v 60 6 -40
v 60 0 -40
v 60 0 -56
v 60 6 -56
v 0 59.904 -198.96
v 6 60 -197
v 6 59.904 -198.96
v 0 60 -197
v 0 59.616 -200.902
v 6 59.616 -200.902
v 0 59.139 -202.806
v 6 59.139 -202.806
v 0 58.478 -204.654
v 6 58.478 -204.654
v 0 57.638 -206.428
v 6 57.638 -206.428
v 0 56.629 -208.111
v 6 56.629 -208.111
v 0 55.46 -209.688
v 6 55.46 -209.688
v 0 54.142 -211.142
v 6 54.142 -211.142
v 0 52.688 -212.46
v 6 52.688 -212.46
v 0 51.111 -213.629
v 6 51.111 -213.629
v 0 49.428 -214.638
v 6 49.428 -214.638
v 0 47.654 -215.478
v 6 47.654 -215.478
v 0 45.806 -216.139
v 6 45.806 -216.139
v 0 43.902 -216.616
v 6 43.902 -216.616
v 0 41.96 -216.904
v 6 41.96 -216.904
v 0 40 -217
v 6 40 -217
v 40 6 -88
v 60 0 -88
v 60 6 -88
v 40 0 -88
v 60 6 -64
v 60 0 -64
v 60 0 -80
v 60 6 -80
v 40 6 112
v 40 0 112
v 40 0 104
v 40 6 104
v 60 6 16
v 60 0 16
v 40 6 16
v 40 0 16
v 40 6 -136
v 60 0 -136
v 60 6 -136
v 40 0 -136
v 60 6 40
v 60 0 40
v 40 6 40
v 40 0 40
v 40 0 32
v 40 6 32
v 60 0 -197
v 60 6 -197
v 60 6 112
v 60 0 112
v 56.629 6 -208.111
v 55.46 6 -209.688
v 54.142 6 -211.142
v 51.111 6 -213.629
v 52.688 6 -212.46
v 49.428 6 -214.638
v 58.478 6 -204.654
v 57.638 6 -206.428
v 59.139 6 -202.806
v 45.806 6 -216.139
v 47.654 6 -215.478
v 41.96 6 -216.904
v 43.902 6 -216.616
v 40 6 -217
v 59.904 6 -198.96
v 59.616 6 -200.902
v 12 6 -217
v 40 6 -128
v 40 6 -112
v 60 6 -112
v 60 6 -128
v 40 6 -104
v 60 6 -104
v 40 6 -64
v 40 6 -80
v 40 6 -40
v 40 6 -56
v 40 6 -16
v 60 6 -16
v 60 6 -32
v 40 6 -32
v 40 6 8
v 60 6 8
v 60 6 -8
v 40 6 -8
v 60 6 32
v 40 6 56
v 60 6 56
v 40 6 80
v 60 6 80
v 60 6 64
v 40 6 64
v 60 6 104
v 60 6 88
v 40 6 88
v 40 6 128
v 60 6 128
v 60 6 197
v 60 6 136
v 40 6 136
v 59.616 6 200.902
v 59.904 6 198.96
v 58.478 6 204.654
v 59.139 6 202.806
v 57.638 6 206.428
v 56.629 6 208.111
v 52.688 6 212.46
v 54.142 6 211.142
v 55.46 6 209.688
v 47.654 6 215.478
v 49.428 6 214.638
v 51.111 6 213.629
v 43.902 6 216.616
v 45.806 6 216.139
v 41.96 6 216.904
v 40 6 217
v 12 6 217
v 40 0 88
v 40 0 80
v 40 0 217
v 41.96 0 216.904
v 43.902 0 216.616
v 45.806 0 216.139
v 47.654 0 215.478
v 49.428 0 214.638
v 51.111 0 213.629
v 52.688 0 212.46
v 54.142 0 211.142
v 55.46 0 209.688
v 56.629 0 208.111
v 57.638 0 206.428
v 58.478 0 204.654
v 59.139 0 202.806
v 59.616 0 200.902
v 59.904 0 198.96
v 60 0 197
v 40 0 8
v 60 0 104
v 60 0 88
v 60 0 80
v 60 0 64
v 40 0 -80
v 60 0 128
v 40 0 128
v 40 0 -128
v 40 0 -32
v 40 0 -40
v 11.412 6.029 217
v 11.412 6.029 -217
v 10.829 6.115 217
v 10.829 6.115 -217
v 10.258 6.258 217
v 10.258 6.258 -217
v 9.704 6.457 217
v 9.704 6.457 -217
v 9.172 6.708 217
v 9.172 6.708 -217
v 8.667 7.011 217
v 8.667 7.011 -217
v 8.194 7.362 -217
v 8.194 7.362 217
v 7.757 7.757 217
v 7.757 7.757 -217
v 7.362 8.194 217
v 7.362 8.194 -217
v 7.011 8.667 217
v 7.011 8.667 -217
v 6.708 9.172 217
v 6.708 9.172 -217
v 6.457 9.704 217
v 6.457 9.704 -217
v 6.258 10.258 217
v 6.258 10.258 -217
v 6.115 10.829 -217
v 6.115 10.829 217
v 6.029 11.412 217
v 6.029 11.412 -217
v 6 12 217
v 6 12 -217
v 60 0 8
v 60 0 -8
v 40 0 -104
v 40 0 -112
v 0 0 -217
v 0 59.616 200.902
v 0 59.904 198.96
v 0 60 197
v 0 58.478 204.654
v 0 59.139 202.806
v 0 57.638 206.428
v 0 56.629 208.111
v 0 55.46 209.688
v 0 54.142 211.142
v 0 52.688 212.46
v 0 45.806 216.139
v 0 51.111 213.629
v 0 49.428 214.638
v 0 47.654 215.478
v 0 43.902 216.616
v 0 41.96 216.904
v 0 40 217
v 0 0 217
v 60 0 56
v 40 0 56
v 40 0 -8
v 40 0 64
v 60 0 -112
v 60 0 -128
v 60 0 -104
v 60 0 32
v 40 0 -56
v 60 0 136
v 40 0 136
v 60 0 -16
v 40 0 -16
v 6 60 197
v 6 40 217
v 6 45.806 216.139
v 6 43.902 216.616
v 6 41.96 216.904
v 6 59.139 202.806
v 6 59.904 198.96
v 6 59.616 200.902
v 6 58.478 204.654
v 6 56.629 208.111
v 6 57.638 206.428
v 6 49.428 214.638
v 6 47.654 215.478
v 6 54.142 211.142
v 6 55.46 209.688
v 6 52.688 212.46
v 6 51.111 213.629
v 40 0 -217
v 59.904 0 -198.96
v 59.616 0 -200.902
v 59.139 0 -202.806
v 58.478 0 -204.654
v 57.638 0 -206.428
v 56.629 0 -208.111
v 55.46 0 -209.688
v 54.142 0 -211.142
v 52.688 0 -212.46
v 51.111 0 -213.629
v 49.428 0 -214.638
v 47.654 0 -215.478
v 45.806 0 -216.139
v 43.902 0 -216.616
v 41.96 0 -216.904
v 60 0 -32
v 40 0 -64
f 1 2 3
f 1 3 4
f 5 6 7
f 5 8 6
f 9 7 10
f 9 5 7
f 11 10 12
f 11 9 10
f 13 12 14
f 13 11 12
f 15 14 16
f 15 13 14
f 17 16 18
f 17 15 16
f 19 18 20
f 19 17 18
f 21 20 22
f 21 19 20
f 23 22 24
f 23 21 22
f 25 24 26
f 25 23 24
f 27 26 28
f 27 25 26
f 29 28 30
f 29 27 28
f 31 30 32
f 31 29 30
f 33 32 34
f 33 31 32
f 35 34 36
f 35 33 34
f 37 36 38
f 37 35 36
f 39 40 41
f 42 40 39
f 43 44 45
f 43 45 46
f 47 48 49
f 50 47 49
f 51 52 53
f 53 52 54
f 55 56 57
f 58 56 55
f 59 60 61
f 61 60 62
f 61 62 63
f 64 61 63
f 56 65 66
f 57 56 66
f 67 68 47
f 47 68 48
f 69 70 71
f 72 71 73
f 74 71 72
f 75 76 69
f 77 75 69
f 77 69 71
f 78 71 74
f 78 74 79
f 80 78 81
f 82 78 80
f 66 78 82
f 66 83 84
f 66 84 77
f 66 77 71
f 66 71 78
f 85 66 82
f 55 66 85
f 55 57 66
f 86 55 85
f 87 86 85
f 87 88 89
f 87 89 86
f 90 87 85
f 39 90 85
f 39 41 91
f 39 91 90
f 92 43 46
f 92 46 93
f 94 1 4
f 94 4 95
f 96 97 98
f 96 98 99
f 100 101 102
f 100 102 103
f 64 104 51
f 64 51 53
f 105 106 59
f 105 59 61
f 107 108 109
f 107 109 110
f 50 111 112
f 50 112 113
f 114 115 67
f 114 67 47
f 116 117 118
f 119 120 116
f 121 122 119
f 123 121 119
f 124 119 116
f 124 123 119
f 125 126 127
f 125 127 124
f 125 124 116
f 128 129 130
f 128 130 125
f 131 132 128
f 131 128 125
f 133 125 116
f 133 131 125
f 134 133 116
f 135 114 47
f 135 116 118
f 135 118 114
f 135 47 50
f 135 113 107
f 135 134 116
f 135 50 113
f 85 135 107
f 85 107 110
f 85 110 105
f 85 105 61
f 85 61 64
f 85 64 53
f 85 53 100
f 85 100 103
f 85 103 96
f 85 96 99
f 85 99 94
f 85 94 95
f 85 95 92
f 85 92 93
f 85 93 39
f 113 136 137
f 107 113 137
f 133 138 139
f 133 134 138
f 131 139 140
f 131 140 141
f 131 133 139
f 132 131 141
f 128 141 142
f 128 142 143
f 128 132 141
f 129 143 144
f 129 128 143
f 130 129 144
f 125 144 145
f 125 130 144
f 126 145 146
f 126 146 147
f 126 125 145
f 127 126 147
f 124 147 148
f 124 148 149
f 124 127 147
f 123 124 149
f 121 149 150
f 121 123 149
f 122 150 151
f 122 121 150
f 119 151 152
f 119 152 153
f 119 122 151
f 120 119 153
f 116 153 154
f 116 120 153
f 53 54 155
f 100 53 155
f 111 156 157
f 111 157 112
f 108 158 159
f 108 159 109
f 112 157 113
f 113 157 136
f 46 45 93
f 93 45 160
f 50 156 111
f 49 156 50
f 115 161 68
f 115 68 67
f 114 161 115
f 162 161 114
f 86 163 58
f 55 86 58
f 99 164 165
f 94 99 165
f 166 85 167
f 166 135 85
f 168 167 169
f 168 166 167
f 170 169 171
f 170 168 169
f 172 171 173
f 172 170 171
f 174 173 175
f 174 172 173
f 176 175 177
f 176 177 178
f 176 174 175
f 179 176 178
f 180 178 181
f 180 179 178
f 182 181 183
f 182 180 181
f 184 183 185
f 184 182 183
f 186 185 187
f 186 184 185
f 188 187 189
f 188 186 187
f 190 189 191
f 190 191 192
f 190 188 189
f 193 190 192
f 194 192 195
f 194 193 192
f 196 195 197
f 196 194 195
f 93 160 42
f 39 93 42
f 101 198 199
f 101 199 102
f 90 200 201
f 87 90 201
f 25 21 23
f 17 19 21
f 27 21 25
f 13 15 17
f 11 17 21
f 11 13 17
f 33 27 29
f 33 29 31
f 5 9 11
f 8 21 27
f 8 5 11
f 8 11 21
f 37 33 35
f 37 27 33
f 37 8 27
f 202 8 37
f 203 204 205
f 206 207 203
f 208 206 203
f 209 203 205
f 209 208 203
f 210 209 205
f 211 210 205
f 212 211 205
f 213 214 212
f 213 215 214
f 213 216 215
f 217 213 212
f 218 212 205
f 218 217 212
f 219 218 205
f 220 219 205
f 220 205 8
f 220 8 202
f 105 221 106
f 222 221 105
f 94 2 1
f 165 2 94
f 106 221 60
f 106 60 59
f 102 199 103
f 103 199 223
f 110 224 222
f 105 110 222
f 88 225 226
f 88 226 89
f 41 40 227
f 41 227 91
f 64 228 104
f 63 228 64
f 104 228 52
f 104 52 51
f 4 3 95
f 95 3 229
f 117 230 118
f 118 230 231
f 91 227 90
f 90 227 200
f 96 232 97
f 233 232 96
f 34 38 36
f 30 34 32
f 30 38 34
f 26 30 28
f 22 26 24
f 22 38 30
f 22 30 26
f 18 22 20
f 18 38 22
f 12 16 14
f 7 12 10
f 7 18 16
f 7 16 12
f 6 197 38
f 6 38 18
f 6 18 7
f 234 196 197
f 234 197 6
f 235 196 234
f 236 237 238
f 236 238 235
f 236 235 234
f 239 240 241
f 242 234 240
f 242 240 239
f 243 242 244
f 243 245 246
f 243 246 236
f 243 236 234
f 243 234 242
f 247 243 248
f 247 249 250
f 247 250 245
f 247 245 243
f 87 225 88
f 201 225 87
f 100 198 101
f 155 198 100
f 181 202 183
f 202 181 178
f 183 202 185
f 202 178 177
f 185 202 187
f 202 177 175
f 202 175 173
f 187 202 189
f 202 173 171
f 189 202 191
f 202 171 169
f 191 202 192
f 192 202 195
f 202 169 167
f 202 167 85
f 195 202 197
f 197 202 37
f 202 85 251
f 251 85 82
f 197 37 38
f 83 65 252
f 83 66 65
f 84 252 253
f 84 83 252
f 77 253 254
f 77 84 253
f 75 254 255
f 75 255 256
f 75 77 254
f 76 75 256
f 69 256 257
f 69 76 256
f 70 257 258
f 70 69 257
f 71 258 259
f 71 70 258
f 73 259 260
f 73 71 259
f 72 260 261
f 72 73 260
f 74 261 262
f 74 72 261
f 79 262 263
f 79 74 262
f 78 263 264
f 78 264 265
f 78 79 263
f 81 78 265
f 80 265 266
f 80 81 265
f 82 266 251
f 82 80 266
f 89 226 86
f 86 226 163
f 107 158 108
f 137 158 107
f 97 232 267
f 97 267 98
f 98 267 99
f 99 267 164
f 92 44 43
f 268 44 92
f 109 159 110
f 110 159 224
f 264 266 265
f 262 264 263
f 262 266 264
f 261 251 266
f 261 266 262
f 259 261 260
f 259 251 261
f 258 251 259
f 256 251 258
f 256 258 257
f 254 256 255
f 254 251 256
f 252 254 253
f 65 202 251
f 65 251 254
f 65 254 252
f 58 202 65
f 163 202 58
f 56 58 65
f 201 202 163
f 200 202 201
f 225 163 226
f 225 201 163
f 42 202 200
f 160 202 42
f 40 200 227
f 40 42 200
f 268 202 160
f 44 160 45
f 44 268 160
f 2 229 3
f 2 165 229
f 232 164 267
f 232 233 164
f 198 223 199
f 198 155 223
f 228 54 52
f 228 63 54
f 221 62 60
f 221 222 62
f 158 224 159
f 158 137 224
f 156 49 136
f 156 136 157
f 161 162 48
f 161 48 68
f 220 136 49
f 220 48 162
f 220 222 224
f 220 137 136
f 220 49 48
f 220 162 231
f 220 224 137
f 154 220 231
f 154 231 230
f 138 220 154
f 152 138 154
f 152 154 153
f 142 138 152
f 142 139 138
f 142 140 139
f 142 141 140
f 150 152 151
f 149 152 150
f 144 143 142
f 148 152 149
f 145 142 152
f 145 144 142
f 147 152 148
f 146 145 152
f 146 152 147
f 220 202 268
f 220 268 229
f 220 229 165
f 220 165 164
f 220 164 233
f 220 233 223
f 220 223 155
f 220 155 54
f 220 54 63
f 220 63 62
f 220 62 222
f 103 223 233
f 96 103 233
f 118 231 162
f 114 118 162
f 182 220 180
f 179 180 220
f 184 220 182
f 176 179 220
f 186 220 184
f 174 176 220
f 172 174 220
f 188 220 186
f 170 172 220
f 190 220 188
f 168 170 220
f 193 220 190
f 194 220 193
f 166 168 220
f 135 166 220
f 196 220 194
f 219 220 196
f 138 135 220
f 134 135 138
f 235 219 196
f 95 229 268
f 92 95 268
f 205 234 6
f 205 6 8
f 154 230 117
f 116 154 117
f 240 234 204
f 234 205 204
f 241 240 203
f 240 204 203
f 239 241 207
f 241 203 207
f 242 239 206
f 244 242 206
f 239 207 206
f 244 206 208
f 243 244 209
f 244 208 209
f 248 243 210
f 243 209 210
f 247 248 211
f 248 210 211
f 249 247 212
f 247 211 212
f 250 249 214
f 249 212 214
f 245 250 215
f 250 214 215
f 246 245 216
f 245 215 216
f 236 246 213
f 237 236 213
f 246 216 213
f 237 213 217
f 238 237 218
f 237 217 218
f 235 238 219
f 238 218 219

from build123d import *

# Parameters (mm, degrees)
EXTRUDE_1_DEPTH            = 217
FILLET_1_R                 = 20
SKETCH_4_W                 = 20
SKETCH_4_H                 = 8
CUT_EXTRUDE_3_DEPTH        = 10
PATTERN_LINEAR_1_COUNT     = 6
PATTERN_LINEAR_1_PITCH     = 24
PATTERN_LINEAR_1_COL_COUNT = 7
PATTERN_LINEAR_1_COL_PITCH = 24
FILLET_2_R                 = 6


with BuildPart() as part:
    # Эскиз1 → Бобышка-Вытянуть1 (new, symmetric)
    with BuildSketch(Plane.XY):
        Polygon((0, 0), (60, 0), (60, 6), (6, 6), (6, 60), (0, 60), align=None)
    extrude(amount=EXTRUDE_1_DEPTH, both=True)

    # Скругление1
    fillet_1_edges = [part.edges().sort_by_distance(p)[0] for p in [
        (60, 3, 217),
        (3, 60, 217),
        (3, 60, -217),
        (60, 3, -217),
    ]]
    fillet(fillet_1_edges, radius=FILLET_1_R)

    # Эскиз4 → Вырез-Вытянуть3 (cut)
    with BuildSketch(Plane(origin=(0, 0, 0), x_dir=(-1, 0, 0), z_dir=(0, -1, 0))):
        with Locations((-50, -12)):
            Rectangle(SKETCH_4_W, SKETCH_4_H)
    cut_extrude_3 = extrude(amount=-CUT_EXTRUDE_3_DEPTH, mode=Mode.SUBTRACT)

    # Линейный массив1: Вырез-Вытянуть3 ×6
    with Locations(*[(0, 0, i * PATTERN_LINEAR_1_PITCH) for i in range(1, PATTERN_LINEAR_1_COUNT)]):
        add(cut_extrude_3, mode=Mode.SUBTRACT)

    # Линейный массив1 col: Вырез-Вытянуть3 ×7
    with Locations(*[(0, 0, -i * PATTERN_LINEAR_1_COL_PITCH) for i in range(1, PATTERN_LINEAR_1_COL_COUNT)]):
        add(cut_extrude_3, mode=Mode.SUBTRACT)

    # Скругление2
    fillet_2_edges = [part.edges().sort_by_distance(p)[0] for p in [
        (6, 6, 0),
    ]]
    fillet(fillet_2_edges, radius=FILLET_2_R)


solid = part.part
